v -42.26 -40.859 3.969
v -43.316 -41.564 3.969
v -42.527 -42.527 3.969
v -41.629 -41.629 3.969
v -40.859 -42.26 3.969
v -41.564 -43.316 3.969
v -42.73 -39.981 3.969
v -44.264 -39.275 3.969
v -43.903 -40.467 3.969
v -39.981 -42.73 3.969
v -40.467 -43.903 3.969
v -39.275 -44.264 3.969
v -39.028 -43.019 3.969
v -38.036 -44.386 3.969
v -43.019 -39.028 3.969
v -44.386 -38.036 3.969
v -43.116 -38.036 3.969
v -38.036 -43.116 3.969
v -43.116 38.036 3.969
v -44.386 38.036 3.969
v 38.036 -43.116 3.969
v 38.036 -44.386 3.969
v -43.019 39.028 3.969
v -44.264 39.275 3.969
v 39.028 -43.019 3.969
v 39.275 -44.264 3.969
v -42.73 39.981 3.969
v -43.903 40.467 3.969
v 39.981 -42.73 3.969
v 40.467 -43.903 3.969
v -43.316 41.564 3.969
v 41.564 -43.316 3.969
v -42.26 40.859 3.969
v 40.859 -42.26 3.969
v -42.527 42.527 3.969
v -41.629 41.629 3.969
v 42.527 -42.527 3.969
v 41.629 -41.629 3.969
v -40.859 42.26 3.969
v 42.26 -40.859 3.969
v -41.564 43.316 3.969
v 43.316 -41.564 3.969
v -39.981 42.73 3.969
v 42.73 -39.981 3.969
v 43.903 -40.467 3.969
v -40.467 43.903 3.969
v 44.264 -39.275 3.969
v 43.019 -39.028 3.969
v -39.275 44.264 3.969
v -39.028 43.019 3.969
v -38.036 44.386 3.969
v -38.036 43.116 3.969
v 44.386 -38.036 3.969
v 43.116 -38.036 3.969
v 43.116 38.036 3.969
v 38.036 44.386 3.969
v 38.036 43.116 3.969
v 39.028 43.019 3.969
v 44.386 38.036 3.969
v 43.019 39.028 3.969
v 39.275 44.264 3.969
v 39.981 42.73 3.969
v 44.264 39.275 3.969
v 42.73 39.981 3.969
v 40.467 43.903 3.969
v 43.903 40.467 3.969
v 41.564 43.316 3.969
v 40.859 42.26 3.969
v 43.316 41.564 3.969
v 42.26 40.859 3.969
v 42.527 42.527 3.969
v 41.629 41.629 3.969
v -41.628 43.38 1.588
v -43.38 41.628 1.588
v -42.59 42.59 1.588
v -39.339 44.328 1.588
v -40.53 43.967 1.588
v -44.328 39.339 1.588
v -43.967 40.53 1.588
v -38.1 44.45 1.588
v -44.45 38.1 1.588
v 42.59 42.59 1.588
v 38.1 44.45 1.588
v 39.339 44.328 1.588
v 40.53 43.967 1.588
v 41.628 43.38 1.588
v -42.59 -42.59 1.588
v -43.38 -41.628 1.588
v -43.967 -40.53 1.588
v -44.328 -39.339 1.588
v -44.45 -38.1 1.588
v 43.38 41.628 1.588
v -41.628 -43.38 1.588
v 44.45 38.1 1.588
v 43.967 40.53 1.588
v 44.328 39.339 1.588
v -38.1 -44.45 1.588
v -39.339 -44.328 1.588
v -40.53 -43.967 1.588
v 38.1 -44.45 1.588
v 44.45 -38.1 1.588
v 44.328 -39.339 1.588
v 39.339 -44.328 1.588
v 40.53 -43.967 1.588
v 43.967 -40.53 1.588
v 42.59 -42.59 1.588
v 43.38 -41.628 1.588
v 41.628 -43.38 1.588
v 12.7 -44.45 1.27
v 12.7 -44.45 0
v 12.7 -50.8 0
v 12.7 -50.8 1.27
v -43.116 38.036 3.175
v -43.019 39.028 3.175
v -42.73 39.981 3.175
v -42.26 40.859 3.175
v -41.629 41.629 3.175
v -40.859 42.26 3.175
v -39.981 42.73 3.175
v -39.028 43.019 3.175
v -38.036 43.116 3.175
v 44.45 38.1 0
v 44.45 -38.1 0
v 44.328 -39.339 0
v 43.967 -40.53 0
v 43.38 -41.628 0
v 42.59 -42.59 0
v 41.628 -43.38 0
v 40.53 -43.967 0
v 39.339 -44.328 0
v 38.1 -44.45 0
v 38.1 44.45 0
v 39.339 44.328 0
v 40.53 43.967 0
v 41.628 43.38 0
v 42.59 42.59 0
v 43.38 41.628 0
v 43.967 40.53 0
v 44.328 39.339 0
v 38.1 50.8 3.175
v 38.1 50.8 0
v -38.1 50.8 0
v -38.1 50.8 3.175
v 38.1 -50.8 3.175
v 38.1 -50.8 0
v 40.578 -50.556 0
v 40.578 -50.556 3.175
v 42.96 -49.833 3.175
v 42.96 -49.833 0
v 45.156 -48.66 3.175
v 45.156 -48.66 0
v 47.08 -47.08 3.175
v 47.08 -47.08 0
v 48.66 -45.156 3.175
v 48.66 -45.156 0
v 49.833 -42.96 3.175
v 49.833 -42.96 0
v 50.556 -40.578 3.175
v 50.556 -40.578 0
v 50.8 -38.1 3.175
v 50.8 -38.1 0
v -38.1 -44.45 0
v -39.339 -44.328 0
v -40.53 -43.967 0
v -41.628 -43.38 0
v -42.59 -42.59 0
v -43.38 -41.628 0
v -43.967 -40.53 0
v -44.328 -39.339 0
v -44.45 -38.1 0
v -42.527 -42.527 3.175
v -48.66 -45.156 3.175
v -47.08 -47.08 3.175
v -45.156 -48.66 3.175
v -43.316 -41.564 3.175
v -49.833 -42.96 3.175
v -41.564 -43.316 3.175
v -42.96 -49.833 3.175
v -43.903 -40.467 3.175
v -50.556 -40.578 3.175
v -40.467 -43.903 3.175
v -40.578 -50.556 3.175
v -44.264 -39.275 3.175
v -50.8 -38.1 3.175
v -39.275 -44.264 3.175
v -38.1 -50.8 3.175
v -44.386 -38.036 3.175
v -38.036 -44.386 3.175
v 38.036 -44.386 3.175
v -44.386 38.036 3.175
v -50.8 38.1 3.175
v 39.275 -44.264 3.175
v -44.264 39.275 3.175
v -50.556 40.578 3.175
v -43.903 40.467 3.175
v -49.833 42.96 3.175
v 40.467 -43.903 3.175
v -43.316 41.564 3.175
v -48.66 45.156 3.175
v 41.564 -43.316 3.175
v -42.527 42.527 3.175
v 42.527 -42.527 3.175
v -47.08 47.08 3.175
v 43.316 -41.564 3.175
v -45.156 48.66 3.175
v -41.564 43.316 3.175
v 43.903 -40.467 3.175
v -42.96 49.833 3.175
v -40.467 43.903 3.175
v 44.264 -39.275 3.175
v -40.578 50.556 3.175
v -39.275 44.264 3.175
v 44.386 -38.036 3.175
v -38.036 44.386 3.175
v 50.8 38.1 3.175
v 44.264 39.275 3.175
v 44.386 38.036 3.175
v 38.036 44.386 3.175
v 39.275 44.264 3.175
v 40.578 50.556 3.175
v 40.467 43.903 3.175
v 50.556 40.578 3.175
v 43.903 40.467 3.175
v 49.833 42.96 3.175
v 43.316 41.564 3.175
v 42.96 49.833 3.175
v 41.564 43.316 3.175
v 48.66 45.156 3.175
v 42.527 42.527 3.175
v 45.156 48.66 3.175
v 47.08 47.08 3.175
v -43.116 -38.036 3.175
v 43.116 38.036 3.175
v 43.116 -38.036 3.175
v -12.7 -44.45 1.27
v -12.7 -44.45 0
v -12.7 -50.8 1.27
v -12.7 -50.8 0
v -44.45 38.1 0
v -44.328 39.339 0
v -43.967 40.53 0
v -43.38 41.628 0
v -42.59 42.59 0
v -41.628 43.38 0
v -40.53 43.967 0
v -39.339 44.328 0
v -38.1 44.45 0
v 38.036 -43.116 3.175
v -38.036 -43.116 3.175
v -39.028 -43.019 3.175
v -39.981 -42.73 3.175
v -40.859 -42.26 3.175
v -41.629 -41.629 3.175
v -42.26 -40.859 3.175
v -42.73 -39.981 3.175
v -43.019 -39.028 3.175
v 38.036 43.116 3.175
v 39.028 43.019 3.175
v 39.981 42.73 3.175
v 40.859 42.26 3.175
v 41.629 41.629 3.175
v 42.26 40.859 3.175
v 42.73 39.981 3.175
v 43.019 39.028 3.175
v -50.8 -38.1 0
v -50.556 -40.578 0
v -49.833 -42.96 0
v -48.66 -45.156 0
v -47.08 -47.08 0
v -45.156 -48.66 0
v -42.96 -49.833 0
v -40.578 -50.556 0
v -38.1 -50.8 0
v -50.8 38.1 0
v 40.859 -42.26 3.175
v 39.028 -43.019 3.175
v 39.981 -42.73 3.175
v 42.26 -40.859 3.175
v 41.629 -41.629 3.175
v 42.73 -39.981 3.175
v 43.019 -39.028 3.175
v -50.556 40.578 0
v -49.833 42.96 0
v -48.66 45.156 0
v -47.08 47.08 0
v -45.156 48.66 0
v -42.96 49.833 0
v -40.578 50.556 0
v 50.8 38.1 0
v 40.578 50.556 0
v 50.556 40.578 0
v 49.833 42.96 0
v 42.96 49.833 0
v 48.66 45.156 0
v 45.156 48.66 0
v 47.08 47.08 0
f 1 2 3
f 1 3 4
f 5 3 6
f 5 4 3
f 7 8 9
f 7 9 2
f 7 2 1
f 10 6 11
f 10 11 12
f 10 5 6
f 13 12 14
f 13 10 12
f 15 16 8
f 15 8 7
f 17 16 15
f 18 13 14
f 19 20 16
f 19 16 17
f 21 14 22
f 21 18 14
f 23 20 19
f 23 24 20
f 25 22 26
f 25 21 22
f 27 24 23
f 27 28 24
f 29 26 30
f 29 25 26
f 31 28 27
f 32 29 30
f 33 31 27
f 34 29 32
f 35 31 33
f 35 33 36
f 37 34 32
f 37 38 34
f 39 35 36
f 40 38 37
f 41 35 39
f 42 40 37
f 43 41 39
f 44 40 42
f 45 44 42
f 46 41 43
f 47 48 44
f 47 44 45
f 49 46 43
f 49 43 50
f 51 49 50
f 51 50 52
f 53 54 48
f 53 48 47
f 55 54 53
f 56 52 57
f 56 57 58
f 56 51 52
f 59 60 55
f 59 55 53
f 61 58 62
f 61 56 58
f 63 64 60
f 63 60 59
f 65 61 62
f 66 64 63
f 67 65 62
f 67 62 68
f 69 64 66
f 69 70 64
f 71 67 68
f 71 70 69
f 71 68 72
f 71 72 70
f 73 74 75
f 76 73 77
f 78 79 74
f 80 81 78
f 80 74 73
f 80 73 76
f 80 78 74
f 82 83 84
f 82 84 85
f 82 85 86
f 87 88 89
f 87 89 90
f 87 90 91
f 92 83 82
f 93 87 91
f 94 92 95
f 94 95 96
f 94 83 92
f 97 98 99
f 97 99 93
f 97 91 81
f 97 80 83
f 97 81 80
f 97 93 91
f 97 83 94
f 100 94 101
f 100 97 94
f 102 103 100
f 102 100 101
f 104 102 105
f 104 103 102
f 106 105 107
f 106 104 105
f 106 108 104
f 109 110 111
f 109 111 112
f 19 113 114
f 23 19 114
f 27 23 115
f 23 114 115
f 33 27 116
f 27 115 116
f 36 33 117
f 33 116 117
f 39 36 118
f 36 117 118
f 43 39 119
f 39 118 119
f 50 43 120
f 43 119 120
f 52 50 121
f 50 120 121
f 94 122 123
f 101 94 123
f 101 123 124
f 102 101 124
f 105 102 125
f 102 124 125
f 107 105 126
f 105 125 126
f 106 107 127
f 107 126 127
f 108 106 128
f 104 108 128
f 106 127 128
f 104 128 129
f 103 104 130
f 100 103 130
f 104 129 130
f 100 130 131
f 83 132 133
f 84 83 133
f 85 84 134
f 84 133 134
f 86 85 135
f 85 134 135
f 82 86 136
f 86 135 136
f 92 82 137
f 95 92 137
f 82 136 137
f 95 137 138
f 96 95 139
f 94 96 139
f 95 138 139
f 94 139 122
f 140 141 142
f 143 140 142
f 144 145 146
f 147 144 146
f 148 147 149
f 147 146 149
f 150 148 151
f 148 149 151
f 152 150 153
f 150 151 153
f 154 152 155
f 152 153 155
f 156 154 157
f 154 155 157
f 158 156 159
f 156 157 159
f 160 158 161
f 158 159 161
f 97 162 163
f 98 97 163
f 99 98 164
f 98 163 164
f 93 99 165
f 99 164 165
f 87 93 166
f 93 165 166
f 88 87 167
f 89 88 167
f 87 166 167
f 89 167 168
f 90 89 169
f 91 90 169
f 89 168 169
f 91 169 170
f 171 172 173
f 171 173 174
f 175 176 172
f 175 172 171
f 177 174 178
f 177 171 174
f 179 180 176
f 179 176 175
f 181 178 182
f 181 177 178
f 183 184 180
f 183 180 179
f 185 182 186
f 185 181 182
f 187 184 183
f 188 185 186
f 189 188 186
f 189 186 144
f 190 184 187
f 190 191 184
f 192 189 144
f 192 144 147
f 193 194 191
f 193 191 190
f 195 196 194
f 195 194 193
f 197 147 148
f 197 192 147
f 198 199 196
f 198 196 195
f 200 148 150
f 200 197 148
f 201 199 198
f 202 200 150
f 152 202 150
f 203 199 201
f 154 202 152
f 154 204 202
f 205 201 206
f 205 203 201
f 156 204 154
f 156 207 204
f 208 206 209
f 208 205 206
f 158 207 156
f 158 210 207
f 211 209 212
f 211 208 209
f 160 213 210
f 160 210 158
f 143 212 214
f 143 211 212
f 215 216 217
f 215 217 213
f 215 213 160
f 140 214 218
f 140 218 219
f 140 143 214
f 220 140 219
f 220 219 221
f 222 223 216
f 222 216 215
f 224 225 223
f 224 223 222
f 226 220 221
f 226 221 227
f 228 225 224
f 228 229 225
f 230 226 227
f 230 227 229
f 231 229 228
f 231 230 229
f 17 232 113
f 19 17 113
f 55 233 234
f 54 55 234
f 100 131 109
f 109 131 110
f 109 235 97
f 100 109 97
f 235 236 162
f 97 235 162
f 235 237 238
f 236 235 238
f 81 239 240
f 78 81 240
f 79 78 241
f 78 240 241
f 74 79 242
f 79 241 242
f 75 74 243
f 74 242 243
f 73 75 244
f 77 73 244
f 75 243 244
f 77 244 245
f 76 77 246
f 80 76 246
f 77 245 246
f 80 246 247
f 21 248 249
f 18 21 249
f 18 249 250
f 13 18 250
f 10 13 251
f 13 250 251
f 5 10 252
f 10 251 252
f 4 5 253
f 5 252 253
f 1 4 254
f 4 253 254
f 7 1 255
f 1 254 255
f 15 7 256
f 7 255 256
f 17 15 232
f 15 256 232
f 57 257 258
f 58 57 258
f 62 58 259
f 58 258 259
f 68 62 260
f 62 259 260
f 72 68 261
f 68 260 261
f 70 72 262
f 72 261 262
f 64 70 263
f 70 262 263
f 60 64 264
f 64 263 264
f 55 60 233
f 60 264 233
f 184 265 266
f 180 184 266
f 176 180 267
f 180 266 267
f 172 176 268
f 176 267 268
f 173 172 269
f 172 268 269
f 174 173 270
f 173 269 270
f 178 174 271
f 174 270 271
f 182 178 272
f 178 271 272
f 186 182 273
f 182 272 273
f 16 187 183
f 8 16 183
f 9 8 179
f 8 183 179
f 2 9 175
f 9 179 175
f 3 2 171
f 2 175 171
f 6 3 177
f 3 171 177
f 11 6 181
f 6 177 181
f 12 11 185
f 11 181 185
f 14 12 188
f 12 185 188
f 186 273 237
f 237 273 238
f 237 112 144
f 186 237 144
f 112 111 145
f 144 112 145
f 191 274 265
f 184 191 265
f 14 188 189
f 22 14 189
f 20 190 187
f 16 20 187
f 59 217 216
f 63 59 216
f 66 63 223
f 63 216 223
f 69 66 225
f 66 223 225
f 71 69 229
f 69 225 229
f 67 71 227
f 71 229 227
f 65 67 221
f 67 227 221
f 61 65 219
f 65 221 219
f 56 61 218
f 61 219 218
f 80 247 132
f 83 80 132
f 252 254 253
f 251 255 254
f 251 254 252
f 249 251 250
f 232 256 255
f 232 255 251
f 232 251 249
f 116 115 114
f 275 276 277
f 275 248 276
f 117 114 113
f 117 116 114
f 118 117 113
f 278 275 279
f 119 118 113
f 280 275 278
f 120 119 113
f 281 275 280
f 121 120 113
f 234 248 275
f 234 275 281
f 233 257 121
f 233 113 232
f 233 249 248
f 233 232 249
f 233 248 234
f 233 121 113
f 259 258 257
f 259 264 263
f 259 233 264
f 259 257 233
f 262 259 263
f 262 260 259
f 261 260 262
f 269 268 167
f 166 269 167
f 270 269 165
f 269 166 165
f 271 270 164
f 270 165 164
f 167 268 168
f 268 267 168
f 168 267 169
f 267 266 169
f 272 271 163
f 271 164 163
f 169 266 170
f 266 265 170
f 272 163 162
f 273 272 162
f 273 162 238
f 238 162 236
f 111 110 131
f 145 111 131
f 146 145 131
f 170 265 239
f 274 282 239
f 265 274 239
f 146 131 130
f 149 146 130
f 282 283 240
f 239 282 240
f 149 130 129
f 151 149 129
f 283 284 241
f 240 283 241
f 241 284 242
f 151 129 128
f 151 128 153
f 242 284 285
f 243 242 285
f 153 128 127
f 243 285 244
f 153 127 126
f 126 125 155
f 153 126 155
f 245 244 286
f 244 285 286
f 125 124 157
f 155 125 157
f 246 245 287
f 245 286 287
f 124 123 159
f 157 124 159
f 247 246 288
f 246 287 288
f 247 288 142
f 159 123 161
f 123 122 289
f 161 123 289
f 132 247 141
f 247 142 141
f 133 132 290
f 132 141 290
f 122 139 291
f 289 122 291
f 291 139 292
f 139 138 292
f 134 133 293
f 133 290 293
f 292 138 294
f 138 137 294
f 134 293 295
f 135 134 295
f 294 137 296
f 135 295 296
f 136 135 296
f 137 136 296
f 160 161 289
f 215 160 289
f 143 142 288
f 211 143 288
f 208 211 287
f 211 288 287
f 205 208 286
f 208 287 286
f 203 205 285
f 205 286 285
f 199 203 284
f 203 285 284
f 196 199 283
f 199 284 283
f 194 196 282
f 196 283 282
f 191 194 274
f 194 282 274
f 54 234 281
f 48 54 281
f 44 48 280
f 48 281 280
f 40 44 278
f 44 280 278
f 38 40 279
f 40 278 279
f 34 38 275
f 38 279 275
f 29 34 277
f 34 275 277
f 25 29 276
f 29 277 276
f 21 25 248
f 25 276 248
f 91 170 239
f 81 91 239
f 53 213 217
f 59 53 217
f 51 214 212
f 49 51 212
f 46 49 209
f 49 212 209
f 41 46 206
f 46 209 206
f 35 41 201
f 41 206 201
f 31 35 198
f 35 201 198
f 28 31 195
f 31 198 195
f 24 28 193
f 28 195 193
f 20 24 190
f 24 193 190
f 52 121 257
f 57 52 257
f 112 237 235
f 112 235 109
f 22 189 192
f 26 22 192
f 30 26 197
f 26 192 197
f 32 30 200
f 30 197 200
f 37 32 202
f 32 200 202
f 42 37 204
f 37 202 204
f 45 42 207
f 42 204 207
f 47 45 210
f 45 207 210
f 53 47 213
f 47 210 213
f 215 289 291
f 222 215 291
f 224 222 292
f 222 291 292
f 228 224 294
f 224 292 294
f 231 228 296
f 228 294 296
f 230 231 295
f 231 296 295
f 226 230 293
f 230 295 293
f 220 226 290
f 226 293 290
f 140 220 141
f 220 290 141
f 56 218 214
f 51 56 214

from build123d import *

# Parameters (mm, degrees)
F1_DEPTH = 3.175
F3_DEPTH = 1.5875
F4_W     = 25.4
F4_H     = 1.27
F5_DEPTH = 25.4
F7_DEPTH = 0.79375


with BuildPart() as f1:
    # F0 (on Top) → F1 (new body)
    with BuildSketch(Plane.XY):
        with BuildLine():
            ThreePointArc((50.8, 38.1), (47.080256, 47.080256), (38.1, 50.8))
            Line((38.1, 50.8), (-38.1, 50.8))
            ThreePointArc((-38.1, 50.8), (-47.080256, 47.080256), (-50.8, 38.1))
            Line((-50.8, 38.1), (-50.8, -38.1))
            ThreePointArc((-50.8, -38.1), (-47.080256, -47.080256), (-38.1, -50.8))
            Line((-38.1, -50.8), (38.1, -50.8))
            ThreePointArc((38.1, -50.8), (47.080256, -47.080256), (50.8, -38.1))
            Line((50.8, -38.1), (50.8, 38.1))
        make_face()
    extrude(amount=F1_DEPTH)

    # F2 (on face) → F3 (cut)
    with BuildSketch(Plane(origin=(0, 0, 0), x_dir=(1, 0, 0), z_dir=(0, 0, -1))):
        with BuildLine():
            ThreePointArc((44.45, 38.1), (42.590128, 42.590128), (38.1, 44.45))
            Line((38.1, 44.45), (-38.1, 44.45))
            ThreePointArc((-38.1, 44.45), (-42.590128, 42.590128), (-44.45, 38.1))
            Line((-44.45, 38.1), (-44.45, -38.1))
            ThreePointArc((-44.45, -38.1), (-42.590128, -42.590128), (-38.1, -44.45))
            Line((-38.1, -44.45), (38.1, -44.45))
            ThreePointArc((38.1, -44.45), (42.590128, -42.590128), (44.45, -38.1))
            Line((44.45, -38.1), (44.45, 38.1))
        make_face()
    extrude(amount=-F3_DEPTH, mode=Mode.SUBTRACT)

    # F4 (on face) → F5 (cut)
    with BuildSketch(Plane.XZ.offset(50.8)):
        with Locations((0, 0.635)):
            Rectangle(F4_W, F4_H)
        with Locations((0, -0.635)):
            Rectangle(F4_W, F4_H)
    extrude(amount=-F5_DEPTH, mode=Mode.SUBTRACT)

    # F6 (on face) → F7 (join)
    with BuildSketch(Plane.XY.offset(3.175)):
        with BuildLine():
            Line((-38.0365, -44.3865), (38.0365, -44.3865))
            ThreePointArc((38.0365, -44.3865), (42.526628, -42.526628), (44.3865, -38.0365))
            Line((44.3865, -38.0365), (44.3865, 38.0365))
            ThreePointArc((44.3865, 38.0365), (42.526628, 42.526628), (38.0365, 44.3865))
            Line((38.0365, 44.3865), (-38.0365, 44.3865))
            ThreePointArc((-38.0365, 44.3865), (-42.526628, 42.526628), (-44.3865, 38.0365))
            Line((-44.3865, 38.0365), (-44.3865, -38.0365))
            ThreePointArc((-44.3865, -38.0365), (-42.526628, -42.526628), (-38.0365, -44.3865))
        make_face()
        with BuildLine():
            ThreePointArc((38.0365, 43.116499), (41.628602, 41.628602), (43.116499, 38.0365))
            Line((43.116499, 38.0365), (43.116499, -38.0365))
            ThreePointArc((43.116499, -38.0365), (41.628602, -41.628602), (38.0365, -43.116499))
            Line((38.0365, -43.116499), (-38.0365, -43.116499))
            ThreePointArc((-38.0365, -43.116499), (-41.628602, -41.628602), (-43.116499, -38.0365))
            Line((-43.116499, -38.0365), (-43.116499, 38.0365))
            ThreePointArc((-43.116499, 38.0365), (-41.628602, 41.628602), (-38.0365, 43.116499))
            Line((-38.0365, 43.116499), (38.0365, 43.116499))
        make_face(mode=Mode.SUBTRACT)
    extrude(amount=F7_DEPTH)


solid = f1.part
